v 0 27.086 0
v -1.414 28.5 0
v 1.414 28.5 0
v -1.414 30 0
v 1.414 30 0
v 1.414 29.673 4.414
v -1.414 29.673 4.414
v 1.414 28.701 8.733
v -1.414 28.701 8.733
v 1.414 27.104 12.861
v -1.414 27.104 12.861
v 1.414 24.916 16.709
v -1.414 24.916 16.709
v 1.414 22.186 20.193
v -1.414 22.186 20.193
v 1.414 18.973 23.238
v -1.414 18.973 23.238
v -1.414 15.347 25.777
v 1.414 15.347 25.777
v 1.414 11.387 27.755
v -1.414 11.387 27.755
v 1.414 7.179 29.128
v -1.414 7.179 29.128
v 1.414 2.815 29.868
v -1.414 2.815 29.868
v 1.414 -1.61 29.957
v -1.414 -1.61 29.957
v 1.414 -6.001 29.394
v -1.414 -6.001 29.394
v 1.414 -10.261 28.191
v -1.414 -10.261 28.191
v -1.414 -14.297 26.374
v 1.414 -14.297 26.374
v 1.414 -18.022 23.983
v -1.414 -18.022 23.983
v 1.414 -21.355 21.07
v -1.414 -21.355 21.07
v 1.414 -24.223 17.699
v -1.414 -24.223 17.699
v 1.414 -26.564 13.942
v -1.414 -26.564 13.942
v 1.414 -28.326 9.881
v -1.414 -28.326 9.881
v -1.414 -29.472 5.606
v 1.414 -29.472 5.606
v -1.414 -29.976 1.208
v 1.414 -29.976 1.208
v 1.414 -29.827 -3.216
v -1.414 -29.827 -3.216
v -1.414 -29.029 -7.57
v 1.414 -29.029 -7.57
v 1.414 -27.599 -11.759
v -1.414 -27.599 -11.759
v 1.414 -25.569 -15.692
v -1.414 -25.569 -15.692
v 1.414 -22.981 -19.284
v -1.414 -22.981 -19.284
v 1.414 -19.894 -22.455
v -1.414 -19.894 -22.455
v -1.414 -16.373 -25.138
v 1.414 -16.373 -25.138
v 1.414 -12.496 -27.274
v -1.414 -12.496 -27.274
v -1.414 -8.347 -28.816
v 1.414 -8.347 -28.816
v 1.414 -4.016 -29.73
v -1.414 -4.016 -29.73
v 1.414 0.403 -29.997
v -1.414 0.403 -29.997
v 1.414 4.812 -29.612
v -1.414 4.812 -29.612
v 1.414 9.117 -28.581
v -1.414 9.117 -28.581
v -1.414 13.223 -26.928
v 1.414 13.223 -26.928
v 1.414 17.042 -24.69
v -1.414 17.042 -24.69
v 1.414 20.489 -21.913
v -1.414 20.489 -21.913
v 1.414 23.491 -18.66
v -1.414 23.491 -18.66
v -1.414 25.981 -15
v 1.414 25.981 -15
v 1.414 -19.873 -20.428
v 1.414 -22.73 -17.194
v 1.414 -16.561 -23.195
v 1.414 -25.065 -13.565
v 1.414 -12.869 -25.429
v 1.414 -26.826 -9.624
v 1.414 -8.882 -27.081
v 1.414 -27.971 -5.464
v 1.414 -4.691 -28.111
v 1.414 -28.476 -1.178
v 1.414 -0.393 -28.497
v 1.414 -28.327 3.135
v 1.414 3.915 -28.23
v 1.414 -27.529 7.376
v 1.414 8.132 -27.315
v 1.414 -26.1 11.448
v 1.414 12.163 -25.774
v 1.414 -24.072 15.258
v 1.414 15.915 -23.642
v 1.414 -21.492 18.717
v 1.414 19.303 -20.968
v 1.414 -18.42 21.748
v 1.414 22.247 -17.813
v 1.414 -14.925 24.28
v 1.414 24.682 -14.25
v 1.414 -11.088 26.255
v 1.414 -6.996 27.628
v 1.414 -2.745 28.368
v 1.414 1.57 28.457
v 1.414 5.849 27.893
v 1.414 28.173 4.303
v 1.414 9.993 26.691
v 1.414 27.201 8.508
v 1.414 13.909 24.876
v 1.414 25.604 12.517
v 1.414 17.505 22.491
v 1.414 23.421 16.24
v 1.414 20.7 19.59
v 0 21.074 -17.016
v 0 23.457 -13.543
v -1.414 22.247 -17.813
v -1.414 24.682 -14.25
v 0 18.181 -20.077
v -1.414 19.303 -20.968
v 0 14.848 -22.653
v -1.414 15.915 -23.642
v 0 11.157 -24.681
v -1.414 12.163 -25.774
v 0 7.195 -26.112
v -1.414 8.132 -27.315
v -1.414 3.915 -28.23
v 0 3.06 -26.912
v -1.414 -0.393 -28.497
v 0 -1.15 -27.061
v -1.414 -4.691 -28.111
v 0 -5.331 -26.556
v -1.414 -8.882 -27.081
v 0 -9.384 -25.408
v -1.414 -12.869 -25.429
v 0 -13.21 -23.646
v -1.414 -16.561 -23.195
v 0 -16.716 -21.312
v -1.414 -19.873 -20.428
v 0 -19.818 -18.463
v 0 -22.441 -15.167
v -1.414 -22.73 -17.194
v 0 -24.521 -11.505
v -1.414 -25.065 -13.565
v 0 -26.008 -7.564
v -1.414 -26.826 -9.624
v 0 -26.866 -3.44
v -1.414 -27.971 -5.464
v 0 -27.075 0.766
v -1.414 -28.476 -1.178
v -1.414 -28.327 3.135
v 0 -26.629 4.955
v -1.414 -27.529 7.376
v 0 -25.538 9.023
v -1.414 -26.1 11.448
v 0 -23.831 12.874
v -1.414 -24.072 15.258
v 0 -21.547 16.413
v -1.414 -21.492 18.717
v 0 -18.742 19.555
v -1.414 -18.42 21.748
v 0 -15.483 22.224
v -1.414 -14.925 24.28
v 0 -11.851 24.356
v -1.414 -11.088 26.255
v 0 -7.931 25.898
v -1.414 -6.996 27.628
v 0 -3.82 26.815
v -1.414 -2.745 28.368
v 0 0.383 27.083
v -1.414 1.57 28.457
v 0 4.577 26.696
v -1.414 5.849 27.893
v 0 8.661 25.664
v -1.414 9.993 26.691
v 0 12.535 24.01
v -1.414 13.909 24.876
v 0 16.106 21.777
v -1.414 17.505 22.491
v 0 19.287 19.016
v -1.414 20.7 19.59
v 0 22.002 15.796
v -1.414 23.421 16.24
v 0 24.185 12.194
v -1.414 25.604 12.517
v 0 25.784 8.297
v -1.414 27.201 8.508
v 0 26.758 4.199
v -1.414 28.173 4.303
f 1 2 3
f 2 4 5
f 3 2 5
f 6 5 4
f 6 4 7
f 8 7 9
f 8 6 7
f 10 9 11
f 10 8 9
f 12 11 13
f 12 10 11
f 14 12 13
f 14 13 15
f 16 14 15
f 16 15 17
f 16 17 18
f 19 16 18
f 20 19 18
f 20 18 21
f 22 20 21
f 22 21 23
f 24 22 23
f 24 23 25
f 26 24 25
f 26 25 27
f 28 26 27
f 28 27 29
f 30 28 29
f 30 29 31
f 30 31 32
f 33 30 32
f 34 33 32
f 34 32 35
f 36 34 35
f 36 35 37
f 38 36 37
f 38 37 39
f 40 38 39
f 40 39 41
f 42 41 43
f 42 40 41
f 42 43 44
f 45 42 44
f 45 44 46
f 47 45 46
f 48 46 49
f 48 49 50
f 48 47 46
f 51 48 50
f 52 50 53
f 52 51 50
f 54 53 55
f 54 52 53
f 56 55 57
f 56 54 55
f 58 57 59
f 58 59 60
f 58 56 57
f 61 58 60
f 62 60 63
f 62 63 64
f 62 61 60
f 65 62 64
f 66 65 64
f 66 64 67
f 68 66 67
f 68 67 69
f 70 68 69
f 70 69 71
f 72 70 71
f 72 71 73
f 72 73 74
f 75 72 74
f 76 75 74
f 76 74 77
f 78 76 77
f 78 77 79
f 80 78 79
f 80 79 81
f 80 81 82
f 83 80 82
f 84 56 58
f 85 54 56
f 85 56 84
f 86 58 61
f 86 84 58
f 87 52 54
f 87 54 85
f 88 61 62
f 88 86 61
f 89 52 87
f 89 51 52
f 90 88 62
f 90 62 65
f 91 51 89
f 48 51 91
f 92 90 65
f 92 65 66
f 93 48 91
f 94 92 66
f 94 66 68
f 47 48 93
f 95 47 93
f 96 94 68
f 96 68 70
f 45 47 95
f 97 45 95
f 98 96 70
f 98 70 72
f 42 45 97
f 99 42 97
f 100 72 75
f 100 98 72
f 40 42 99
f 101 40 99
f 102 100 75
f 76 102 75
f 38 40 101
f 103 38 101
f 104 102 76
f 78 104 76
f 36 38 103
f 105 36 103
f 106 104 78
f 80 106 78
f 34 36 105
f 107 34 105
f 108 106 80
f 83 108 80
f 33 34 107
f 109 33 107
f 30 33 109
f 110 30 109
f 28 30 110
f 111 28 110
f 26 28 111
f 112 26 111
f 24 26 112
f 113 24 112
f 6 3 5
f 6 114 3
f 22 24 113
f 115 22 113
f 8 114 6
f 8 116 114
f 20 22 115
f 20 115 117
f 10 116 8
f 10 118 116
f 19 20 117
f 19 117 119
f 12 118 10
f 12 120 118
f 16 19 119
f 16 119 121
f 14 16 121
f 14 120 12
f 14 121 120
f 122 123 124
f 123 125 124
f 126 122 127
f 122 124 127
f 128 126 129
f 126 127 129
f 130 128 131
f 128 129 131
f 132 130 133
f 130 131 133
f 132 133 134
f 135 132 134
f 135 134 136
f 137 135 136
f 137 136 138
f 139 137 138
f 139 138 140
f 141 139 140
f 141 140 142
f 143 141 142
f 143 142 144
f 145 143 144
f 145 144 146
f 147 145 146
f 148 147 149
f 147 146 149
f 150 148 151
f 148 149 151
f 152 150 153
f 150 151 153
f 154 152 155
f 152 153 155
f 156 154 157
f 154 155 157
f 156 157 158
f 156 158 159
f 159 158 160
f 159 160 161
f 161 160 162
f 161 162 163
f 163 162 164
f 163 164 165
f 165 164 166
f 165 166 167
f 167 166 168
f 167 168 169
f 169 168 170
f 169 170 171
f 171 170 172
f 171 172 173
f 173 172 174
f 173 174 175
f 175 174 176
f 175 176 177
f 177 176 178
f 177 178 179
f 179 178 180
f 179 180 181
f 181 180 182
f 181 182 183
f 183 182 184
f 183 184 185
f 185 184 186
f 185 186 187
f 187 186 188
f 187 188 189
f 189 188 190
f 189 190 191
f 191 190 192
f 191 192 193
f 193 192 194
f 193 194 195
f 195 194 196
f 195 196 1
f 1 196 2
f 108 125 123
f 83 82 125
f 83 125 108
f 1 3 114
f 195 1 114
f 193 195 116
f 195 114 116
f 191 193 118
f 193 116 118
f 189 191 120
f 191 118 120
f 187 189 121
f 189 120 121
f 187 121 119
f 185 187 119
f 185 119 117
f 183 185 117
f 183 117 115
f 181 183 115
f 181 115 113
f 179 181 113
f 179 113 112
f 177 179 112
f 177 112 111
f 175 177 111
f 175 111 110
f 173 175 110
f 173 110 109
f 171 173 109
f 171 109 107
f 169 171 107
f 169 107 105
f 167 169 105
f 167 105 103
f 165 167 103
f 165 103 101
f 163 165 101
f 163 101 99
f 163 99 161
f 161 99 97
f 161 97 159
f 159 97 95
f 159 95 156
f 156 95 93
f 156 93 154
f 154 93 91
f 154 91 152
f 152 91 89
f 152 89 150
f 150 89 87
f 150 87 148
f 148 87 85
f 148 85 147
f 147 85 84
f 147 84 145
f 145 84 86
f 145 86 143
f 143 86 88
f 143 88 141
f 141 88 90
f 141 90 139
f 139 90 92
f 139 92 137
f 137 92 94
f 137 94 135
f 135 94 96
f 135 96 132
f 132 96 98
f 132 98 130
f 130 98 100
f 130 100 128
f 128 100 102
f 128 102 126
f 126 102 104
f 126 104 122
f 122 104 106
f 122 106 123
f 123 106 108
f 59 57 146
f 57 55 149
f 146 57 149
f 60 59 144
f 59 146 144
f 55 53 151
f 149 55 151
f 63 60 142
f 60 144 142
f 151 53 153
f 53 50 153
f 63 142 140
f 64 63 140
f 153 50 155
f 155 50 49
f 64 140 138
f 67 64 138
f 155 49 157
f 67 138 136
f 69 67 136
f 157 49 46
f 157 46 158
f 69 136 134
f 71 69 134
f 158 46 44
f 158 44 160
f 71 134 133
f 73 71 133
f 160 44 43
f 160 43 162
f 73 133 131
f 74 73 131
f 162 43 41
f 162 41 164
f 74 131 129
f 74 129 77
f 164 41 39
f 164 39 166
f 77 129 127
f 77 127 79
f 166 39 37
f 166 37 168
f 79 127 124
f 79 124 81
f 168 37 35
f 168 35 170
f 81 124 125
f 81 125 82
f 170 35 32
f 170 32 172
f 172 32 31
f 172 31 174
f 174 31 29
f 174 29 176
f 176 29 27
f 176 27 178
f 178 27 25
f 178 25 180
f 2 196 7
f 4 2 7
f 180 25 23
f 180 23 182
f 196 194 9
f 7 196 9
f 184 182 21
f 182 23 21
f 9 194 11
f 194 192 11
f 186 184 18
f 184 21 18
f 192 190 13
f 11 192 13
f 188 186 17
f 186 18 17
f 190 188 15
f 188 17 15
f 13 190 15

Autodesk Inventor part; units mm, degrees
ref_plane "YZ Plane" through (0, 0, 0) normal (1, 0, 0) x (0, 1, 0)
ref_plane "XZ Plane" through (0, 0, 0) normal (0, 1, 0) x (-1, 0, 0)
ref_plane "XY Plane" through (0, 0, 0) normal (0, 0, 1) x (1, 0, 0)
sketch "Sketch1" plane through (0, 0, 0) normal (0, 0, 1) x (1, 0, 0)
  line L0 (0, 27.0856) -> (-1.414, 28.5)
  line L1 (-1.414, 28.5) -> (-1.414, 30)
  line L2 (-1.414, 30) -> (1.414, 30)
  line L3 (1.414, 30) -> (1.414, 28.5)
  line L4 (1.414, 28.5) -> (0, 27.0856)
  line L5 (-5, 0) -> (5, 0)
  point P0 (0, 0)
  point P1 (0, 30)
  point P2 (0, 0)
  dimension "d0" = 2
  dimension "d1" = 10
  dimension "d3" = 57
  dimension "d4" = 2.828
  dimension "d5" = 1.5
revolve "Revolution1" add sketch "Sketch1" angle 330 about axis through (-5, 0, 0) along (1, 0, 0)
properties part number "Pierścień klinowy"
